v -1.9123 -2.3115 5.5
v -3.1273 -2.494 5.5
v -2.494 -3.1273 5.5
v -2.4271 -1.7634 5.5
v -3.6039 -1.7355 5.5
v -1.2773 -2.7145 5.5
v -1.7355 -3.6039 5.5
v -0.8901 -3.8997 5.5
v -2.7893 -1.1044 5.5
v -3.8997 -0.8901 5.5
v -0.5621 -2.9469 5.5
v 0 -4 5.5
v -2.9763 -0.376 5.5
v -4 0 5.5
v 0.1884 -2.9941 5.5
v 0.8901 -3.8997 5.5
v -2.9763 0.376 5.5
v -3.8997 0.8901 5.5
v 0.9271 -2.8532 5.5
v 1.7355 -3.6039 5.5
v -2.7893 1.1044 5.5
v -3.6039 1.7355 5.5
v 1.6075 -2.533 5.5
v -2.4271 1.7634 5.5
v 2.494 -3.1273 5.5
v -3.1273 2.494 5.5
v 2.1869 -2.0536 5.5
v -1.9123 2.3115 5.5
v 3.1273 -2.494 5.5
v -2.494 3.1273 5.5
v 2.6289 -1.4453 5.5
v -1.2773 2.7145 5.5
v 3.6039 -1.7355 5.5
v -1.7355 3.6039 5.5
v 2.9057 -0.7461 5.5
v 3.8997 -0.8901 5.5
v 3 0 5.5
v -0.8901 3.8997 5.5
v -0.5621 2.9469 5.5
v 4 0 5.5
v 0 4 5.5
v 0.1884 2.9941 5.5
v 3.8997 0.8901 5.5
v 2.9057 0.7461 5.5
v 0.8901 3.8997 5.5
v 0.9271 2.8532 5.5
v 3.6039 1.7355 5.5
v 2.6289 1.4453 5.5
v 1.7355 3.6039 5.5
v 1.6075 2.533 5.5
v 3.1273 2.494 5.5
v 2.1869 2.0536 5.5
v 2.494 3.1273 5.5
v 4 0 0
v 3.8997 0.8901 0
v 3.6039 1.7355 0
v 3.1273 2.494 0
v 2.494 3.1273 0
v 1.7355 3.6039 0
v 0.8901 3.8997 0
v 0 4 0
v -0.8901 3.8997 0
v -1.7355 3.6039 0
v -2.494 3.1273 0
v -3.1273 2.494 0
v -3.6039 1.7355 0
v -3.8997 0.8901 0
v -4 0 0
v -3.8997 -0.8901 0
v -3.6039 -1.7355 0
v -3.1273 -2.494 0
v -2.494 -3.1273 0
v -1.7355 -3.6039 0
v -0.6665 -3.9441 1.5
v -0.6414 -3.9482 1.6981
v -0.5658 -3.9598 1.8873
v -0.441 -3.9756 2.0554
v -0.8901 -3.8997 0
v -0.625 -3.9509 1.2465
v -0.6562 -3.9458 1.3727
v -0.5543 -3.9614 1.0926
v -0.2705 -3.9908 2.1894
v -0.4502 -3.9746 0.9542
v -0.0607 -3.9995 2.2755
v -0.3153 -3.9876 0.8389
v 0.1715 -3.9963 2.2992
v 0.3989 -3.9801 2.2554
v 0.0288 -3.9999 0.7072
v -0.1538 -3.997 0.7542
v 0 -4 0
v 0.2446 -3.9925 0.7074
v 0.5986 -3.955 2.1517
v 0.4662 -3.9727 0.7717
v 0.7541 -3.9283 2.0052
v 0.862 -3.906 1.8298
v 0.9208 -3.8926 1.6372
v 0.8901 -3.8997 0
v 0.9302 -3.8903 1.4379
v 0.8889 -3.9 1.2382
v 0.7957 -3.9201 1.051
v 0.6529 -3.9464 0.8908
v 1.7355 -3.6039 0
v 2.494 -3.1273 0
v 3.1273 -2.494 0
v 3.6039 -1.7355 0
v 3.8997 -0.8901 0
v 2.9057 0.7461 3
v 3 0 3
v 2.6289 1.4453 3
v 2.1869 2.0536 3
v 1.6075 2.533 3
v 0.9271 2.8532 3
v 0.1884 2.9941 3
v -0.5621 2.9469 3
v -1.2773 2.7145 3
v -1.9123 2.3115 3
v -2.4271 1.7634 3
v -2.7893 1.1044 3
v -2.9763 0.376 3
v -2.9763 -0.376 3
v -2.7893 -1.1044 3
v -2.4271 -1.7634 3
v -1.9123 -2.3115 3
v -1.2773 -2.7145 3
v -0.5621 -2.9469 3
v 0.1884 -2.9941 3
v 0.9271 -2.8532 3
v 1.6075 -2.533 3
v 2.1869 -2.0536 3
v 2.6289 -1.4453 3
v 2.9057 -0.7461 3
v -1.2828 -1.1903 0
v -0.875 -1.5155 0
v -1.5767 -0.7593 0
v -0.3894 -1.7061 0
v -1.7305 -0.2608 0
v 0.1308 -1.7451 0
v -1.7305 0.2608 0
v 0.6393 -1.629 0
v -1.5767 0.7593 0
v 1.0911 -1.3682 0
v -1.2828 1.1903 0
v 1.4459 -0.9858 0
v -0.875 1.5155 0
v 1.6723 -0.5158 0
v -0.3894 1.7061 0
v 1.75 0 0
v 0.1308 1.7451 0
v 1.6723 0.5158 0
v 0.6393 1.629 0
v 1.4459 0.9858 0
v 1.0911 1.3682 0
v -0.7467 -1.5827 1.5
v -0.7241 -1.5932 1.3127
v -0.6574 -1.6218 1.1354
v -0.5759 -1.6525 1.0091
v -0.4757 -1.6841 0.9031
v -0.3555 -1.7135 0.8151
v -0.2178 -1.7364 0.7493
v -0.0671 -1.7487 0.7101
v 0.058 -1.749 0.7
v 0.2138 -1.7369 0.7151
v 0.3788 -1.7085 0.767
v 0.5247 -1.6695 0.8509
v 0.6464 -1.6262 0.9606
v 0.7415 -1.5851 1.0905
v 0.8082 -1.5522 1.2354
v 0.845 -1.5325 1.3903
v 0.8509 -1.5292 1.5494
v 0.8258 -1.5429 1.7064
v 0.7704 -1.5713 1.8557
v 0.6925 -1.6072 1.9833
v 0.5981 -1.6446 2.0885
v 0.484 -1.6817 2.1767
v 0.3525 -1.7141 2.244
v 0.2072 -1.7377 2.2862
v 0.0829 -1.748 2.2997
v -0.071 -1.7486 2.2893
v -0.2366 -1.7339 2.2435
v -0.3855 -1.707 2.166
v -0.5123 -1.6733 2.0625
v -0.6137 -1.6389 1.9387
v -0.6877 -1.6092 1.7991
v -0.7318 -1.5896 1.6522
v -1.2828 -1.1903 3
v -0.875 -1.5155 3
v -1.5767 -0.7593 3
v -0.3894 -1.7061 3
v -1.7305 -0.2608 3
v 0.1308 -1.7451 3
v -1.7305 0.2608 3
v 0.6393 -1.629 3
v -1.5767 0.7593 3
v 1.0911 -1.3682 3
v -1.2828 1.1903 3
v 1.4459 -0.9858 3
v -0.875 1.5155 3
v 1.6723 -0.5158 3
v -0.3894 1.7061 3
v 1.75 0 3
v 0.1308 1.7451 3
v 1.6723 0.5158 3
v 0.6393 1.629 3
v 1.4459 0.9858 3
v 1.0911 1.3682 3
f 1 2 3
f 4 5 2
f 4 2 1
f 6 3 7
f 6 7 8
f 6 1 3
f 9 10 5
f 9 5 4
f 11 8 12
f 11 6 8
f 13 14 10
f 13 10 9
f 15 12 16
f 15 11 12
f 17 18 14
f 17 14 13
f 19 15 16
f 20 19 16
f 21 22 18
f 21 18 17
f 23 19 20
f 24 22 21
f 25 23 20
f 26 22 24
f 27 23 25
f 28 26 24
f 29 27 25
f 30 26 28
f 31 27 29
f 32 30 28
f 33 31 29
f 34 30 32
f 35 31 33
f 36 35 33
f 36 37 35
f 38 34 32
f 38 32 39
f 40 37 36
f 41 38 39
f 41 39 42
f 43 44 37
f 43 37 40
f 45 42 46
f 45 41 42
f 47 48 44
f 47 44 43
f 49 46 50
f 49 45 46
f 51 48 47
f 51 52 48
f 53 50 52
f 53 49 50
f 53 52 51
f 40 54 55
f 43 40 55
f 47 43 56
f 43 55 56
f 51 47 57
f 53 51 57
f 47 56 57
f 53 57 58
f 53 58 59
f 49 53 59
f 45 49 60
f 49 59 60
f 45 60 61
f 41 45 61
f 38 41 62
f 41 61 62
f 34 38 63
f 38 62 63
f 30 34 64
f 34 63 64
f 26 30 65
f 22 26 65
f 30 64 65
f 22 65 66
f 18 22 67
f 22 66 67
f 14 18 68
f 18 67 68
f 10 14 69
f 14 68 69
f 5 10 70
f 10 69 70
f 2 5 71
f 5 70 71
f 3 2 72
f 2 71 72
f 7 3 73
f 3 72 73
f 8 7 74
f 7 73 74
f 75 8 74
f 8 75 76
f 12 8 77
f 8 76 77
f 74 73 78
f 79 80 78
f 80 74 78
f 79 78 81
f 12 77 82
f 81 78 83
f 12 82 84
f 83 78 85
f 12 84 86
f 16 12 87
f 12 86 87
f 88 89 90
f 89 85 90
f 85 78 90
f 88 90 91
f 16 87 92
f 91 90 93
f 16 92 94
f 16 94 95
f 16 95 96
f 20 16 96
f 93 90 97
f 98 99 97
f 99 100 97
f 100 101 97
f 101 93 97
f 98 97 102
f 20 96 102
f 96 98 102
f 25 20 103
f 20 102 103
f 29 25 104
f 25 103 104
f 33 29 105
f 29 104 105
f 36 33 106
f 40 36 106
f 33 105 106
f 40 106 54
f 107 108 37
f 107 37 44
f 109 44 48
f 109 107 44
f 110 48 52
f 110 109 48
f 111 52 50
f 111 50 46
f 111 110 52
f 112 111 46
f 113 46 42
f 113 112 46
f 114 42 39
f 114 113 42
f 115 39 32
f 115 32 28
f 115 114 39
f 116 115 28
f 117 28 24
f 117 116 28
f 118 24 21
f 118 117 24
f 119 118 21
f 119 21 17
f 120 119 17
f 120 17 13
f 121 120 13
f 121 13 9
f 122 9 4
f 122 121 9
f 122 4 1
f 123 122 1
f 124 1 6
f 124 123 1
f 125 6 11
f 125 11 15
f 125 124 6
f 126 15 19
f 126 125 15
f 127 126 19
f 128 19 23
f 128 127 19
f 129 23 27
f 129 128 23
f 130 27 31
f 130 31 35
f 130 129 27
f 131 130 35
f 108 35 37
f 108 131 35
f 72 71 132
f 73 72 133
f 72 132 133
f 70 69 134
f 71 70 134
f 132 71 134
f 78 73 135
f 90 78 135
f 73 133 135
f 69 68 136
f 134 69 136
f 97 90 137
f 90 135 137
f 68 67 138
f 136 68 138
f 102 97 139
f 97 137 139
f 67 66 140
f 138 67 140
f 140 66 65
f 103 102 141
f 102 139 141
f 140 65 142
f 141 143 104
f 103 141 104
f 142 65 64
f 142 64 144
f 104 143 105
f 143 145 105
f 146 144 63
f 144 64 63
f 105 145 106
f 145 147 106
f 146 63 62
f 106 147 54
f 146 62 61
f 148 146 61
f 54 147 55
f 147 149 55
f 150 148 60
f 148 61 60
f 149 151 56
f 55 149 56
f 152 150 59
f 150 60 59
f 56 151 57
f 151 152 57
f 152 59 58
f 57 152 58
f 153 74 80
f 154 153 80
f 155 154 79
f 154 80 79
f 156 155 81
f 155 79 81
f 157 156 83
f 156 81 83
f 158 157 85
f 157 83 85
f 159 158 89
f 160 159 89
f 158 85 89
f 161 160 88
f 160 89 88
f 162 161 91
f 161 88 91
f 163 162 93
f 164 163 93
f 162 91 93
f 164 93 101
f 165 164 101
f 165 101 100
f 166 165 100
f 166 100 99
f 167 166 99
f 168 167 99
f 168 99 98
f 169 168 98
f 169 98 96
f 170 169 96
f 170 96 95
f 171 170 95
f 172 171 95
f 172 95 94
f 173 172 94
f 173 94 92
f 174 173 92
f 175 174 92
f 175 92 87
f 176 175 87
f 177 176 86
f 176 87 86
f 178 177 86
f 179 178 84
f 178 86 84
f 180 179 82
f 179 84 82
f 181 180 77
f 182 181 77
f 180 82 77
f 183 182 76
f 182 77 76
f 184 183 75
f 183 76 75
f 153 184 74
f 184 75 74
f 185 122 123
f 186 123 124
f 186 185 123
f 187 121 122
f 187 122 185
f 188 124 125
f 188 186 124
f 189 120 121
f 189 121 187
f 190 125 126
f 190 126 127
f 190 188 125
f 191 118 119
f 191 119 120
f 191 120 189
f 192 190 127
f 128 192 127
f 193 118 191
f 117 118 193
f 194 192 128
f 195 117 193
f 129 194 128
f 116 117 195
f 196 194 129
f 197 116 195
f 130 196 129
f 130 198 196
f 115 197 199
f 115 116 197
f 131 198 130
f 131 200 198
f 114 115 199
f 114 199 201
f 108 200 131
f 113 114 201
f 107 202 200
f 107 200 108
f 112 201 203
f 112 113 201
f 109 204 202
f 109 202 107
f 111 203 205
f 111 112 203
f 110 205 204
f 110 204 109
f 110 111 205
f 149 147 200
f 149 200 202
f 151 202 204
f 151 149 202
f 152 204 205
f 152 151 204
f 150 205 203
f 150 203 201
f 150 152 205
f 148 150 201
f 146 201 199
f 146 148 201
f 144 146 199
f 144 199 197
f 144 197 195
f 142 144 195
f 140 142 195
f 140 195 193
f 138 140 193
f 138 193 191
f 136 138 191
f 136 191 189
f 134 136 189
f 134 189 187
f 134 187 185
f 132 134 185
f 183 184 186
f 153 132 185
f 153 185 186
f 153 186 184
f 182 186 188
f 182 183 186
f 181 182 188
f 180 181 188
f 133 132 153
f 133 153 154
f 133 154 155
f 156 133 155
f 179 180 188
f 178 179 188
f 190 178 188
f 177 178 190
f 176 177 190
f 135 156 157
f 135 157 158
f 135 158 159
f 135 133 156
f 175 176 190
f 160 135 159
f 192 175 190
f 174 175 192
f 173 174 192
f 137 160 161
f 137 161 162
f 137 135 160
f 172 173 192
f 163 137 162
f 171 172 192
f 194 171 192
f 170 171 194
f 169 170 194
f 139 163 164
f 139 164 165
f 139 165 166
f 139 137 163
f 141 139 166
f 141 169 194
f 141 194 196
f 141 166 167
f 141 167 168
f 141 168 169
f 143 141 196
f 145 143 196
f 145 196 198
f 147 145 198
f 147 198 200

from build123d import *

# Parameters (mm, degrees)
SKETCH1_R                        = 4
SKETCH1_R_2                      = 1.75
BOSS_EXTRUDE1_DEPTH              = 3
SKETCH2_R                        = 4
SKETCH2_R_2                      = 3
BOSS_EXTRUDE2_DEPTH              = 2.5
TAP_DRILL_FOR_M2X0_4_TAP1_REACH  = 11.852
TAP_DRILL_FOR_M2X0_4_TAP1_BORE_R = 0.8


with BuildPart() as part:
    # Sketch1 → Boss-Extrude1 (new body)
    with BuildSketch(Plane.XY):
        Circle(SKETCH1_R)
        Circle(SKETCH1_R_2, mode=Mode.SUBTRACT)
    extrude(amount=BOSS_EXTRUDE1_DEPTH)

    # Sketch2 → Boss-Extrude2 (add)
    with BuildSketch(Plane.XY.offset(3)):
        Circle(SKETCH2_R)
        Circle(SKETCH2_R_2, mode=Mode.SUBTRACT)
    extrude(amount=BOSS_EXTRUDE2_DEPTH)

    # Tap Drill for M2x0.4 Tap1 bore (on position points) → Tap Drill for M2x0.4 Tap1 (cut, up to next)
    with BuildSketch(Plane(origin=(0.135818607, -3.997693498, 1.5), x_dir=(-0.999423374561, -0.033954651826, 0), z_dir=(0.033954651826, -0.999423374561, 0)), mode=Mode.PRIVATE) as tap_drill_for_m2x0_4_tap1_sk1:
        Circle(TAP_DRILL_FOR_M2X0_4_TAP1_BORE_R)
    tap_drill_for_m2x0_4_tap1_tool1 = extrude(tap_drill_for_m2x0_4_tap1_sk1.sketch, amount=-TAP_DRILL_FOR_M2X0_4_TAP1_REACH, mode=Mode.PRIVATE) & part.part
    add(tap_drill_for_m2x0_4_tap1_tool1.solids().sort_by_distance((0.135819, -3.997693, 1.5))[0], mode=Mode.SUBTRACT)


solid = part.part
